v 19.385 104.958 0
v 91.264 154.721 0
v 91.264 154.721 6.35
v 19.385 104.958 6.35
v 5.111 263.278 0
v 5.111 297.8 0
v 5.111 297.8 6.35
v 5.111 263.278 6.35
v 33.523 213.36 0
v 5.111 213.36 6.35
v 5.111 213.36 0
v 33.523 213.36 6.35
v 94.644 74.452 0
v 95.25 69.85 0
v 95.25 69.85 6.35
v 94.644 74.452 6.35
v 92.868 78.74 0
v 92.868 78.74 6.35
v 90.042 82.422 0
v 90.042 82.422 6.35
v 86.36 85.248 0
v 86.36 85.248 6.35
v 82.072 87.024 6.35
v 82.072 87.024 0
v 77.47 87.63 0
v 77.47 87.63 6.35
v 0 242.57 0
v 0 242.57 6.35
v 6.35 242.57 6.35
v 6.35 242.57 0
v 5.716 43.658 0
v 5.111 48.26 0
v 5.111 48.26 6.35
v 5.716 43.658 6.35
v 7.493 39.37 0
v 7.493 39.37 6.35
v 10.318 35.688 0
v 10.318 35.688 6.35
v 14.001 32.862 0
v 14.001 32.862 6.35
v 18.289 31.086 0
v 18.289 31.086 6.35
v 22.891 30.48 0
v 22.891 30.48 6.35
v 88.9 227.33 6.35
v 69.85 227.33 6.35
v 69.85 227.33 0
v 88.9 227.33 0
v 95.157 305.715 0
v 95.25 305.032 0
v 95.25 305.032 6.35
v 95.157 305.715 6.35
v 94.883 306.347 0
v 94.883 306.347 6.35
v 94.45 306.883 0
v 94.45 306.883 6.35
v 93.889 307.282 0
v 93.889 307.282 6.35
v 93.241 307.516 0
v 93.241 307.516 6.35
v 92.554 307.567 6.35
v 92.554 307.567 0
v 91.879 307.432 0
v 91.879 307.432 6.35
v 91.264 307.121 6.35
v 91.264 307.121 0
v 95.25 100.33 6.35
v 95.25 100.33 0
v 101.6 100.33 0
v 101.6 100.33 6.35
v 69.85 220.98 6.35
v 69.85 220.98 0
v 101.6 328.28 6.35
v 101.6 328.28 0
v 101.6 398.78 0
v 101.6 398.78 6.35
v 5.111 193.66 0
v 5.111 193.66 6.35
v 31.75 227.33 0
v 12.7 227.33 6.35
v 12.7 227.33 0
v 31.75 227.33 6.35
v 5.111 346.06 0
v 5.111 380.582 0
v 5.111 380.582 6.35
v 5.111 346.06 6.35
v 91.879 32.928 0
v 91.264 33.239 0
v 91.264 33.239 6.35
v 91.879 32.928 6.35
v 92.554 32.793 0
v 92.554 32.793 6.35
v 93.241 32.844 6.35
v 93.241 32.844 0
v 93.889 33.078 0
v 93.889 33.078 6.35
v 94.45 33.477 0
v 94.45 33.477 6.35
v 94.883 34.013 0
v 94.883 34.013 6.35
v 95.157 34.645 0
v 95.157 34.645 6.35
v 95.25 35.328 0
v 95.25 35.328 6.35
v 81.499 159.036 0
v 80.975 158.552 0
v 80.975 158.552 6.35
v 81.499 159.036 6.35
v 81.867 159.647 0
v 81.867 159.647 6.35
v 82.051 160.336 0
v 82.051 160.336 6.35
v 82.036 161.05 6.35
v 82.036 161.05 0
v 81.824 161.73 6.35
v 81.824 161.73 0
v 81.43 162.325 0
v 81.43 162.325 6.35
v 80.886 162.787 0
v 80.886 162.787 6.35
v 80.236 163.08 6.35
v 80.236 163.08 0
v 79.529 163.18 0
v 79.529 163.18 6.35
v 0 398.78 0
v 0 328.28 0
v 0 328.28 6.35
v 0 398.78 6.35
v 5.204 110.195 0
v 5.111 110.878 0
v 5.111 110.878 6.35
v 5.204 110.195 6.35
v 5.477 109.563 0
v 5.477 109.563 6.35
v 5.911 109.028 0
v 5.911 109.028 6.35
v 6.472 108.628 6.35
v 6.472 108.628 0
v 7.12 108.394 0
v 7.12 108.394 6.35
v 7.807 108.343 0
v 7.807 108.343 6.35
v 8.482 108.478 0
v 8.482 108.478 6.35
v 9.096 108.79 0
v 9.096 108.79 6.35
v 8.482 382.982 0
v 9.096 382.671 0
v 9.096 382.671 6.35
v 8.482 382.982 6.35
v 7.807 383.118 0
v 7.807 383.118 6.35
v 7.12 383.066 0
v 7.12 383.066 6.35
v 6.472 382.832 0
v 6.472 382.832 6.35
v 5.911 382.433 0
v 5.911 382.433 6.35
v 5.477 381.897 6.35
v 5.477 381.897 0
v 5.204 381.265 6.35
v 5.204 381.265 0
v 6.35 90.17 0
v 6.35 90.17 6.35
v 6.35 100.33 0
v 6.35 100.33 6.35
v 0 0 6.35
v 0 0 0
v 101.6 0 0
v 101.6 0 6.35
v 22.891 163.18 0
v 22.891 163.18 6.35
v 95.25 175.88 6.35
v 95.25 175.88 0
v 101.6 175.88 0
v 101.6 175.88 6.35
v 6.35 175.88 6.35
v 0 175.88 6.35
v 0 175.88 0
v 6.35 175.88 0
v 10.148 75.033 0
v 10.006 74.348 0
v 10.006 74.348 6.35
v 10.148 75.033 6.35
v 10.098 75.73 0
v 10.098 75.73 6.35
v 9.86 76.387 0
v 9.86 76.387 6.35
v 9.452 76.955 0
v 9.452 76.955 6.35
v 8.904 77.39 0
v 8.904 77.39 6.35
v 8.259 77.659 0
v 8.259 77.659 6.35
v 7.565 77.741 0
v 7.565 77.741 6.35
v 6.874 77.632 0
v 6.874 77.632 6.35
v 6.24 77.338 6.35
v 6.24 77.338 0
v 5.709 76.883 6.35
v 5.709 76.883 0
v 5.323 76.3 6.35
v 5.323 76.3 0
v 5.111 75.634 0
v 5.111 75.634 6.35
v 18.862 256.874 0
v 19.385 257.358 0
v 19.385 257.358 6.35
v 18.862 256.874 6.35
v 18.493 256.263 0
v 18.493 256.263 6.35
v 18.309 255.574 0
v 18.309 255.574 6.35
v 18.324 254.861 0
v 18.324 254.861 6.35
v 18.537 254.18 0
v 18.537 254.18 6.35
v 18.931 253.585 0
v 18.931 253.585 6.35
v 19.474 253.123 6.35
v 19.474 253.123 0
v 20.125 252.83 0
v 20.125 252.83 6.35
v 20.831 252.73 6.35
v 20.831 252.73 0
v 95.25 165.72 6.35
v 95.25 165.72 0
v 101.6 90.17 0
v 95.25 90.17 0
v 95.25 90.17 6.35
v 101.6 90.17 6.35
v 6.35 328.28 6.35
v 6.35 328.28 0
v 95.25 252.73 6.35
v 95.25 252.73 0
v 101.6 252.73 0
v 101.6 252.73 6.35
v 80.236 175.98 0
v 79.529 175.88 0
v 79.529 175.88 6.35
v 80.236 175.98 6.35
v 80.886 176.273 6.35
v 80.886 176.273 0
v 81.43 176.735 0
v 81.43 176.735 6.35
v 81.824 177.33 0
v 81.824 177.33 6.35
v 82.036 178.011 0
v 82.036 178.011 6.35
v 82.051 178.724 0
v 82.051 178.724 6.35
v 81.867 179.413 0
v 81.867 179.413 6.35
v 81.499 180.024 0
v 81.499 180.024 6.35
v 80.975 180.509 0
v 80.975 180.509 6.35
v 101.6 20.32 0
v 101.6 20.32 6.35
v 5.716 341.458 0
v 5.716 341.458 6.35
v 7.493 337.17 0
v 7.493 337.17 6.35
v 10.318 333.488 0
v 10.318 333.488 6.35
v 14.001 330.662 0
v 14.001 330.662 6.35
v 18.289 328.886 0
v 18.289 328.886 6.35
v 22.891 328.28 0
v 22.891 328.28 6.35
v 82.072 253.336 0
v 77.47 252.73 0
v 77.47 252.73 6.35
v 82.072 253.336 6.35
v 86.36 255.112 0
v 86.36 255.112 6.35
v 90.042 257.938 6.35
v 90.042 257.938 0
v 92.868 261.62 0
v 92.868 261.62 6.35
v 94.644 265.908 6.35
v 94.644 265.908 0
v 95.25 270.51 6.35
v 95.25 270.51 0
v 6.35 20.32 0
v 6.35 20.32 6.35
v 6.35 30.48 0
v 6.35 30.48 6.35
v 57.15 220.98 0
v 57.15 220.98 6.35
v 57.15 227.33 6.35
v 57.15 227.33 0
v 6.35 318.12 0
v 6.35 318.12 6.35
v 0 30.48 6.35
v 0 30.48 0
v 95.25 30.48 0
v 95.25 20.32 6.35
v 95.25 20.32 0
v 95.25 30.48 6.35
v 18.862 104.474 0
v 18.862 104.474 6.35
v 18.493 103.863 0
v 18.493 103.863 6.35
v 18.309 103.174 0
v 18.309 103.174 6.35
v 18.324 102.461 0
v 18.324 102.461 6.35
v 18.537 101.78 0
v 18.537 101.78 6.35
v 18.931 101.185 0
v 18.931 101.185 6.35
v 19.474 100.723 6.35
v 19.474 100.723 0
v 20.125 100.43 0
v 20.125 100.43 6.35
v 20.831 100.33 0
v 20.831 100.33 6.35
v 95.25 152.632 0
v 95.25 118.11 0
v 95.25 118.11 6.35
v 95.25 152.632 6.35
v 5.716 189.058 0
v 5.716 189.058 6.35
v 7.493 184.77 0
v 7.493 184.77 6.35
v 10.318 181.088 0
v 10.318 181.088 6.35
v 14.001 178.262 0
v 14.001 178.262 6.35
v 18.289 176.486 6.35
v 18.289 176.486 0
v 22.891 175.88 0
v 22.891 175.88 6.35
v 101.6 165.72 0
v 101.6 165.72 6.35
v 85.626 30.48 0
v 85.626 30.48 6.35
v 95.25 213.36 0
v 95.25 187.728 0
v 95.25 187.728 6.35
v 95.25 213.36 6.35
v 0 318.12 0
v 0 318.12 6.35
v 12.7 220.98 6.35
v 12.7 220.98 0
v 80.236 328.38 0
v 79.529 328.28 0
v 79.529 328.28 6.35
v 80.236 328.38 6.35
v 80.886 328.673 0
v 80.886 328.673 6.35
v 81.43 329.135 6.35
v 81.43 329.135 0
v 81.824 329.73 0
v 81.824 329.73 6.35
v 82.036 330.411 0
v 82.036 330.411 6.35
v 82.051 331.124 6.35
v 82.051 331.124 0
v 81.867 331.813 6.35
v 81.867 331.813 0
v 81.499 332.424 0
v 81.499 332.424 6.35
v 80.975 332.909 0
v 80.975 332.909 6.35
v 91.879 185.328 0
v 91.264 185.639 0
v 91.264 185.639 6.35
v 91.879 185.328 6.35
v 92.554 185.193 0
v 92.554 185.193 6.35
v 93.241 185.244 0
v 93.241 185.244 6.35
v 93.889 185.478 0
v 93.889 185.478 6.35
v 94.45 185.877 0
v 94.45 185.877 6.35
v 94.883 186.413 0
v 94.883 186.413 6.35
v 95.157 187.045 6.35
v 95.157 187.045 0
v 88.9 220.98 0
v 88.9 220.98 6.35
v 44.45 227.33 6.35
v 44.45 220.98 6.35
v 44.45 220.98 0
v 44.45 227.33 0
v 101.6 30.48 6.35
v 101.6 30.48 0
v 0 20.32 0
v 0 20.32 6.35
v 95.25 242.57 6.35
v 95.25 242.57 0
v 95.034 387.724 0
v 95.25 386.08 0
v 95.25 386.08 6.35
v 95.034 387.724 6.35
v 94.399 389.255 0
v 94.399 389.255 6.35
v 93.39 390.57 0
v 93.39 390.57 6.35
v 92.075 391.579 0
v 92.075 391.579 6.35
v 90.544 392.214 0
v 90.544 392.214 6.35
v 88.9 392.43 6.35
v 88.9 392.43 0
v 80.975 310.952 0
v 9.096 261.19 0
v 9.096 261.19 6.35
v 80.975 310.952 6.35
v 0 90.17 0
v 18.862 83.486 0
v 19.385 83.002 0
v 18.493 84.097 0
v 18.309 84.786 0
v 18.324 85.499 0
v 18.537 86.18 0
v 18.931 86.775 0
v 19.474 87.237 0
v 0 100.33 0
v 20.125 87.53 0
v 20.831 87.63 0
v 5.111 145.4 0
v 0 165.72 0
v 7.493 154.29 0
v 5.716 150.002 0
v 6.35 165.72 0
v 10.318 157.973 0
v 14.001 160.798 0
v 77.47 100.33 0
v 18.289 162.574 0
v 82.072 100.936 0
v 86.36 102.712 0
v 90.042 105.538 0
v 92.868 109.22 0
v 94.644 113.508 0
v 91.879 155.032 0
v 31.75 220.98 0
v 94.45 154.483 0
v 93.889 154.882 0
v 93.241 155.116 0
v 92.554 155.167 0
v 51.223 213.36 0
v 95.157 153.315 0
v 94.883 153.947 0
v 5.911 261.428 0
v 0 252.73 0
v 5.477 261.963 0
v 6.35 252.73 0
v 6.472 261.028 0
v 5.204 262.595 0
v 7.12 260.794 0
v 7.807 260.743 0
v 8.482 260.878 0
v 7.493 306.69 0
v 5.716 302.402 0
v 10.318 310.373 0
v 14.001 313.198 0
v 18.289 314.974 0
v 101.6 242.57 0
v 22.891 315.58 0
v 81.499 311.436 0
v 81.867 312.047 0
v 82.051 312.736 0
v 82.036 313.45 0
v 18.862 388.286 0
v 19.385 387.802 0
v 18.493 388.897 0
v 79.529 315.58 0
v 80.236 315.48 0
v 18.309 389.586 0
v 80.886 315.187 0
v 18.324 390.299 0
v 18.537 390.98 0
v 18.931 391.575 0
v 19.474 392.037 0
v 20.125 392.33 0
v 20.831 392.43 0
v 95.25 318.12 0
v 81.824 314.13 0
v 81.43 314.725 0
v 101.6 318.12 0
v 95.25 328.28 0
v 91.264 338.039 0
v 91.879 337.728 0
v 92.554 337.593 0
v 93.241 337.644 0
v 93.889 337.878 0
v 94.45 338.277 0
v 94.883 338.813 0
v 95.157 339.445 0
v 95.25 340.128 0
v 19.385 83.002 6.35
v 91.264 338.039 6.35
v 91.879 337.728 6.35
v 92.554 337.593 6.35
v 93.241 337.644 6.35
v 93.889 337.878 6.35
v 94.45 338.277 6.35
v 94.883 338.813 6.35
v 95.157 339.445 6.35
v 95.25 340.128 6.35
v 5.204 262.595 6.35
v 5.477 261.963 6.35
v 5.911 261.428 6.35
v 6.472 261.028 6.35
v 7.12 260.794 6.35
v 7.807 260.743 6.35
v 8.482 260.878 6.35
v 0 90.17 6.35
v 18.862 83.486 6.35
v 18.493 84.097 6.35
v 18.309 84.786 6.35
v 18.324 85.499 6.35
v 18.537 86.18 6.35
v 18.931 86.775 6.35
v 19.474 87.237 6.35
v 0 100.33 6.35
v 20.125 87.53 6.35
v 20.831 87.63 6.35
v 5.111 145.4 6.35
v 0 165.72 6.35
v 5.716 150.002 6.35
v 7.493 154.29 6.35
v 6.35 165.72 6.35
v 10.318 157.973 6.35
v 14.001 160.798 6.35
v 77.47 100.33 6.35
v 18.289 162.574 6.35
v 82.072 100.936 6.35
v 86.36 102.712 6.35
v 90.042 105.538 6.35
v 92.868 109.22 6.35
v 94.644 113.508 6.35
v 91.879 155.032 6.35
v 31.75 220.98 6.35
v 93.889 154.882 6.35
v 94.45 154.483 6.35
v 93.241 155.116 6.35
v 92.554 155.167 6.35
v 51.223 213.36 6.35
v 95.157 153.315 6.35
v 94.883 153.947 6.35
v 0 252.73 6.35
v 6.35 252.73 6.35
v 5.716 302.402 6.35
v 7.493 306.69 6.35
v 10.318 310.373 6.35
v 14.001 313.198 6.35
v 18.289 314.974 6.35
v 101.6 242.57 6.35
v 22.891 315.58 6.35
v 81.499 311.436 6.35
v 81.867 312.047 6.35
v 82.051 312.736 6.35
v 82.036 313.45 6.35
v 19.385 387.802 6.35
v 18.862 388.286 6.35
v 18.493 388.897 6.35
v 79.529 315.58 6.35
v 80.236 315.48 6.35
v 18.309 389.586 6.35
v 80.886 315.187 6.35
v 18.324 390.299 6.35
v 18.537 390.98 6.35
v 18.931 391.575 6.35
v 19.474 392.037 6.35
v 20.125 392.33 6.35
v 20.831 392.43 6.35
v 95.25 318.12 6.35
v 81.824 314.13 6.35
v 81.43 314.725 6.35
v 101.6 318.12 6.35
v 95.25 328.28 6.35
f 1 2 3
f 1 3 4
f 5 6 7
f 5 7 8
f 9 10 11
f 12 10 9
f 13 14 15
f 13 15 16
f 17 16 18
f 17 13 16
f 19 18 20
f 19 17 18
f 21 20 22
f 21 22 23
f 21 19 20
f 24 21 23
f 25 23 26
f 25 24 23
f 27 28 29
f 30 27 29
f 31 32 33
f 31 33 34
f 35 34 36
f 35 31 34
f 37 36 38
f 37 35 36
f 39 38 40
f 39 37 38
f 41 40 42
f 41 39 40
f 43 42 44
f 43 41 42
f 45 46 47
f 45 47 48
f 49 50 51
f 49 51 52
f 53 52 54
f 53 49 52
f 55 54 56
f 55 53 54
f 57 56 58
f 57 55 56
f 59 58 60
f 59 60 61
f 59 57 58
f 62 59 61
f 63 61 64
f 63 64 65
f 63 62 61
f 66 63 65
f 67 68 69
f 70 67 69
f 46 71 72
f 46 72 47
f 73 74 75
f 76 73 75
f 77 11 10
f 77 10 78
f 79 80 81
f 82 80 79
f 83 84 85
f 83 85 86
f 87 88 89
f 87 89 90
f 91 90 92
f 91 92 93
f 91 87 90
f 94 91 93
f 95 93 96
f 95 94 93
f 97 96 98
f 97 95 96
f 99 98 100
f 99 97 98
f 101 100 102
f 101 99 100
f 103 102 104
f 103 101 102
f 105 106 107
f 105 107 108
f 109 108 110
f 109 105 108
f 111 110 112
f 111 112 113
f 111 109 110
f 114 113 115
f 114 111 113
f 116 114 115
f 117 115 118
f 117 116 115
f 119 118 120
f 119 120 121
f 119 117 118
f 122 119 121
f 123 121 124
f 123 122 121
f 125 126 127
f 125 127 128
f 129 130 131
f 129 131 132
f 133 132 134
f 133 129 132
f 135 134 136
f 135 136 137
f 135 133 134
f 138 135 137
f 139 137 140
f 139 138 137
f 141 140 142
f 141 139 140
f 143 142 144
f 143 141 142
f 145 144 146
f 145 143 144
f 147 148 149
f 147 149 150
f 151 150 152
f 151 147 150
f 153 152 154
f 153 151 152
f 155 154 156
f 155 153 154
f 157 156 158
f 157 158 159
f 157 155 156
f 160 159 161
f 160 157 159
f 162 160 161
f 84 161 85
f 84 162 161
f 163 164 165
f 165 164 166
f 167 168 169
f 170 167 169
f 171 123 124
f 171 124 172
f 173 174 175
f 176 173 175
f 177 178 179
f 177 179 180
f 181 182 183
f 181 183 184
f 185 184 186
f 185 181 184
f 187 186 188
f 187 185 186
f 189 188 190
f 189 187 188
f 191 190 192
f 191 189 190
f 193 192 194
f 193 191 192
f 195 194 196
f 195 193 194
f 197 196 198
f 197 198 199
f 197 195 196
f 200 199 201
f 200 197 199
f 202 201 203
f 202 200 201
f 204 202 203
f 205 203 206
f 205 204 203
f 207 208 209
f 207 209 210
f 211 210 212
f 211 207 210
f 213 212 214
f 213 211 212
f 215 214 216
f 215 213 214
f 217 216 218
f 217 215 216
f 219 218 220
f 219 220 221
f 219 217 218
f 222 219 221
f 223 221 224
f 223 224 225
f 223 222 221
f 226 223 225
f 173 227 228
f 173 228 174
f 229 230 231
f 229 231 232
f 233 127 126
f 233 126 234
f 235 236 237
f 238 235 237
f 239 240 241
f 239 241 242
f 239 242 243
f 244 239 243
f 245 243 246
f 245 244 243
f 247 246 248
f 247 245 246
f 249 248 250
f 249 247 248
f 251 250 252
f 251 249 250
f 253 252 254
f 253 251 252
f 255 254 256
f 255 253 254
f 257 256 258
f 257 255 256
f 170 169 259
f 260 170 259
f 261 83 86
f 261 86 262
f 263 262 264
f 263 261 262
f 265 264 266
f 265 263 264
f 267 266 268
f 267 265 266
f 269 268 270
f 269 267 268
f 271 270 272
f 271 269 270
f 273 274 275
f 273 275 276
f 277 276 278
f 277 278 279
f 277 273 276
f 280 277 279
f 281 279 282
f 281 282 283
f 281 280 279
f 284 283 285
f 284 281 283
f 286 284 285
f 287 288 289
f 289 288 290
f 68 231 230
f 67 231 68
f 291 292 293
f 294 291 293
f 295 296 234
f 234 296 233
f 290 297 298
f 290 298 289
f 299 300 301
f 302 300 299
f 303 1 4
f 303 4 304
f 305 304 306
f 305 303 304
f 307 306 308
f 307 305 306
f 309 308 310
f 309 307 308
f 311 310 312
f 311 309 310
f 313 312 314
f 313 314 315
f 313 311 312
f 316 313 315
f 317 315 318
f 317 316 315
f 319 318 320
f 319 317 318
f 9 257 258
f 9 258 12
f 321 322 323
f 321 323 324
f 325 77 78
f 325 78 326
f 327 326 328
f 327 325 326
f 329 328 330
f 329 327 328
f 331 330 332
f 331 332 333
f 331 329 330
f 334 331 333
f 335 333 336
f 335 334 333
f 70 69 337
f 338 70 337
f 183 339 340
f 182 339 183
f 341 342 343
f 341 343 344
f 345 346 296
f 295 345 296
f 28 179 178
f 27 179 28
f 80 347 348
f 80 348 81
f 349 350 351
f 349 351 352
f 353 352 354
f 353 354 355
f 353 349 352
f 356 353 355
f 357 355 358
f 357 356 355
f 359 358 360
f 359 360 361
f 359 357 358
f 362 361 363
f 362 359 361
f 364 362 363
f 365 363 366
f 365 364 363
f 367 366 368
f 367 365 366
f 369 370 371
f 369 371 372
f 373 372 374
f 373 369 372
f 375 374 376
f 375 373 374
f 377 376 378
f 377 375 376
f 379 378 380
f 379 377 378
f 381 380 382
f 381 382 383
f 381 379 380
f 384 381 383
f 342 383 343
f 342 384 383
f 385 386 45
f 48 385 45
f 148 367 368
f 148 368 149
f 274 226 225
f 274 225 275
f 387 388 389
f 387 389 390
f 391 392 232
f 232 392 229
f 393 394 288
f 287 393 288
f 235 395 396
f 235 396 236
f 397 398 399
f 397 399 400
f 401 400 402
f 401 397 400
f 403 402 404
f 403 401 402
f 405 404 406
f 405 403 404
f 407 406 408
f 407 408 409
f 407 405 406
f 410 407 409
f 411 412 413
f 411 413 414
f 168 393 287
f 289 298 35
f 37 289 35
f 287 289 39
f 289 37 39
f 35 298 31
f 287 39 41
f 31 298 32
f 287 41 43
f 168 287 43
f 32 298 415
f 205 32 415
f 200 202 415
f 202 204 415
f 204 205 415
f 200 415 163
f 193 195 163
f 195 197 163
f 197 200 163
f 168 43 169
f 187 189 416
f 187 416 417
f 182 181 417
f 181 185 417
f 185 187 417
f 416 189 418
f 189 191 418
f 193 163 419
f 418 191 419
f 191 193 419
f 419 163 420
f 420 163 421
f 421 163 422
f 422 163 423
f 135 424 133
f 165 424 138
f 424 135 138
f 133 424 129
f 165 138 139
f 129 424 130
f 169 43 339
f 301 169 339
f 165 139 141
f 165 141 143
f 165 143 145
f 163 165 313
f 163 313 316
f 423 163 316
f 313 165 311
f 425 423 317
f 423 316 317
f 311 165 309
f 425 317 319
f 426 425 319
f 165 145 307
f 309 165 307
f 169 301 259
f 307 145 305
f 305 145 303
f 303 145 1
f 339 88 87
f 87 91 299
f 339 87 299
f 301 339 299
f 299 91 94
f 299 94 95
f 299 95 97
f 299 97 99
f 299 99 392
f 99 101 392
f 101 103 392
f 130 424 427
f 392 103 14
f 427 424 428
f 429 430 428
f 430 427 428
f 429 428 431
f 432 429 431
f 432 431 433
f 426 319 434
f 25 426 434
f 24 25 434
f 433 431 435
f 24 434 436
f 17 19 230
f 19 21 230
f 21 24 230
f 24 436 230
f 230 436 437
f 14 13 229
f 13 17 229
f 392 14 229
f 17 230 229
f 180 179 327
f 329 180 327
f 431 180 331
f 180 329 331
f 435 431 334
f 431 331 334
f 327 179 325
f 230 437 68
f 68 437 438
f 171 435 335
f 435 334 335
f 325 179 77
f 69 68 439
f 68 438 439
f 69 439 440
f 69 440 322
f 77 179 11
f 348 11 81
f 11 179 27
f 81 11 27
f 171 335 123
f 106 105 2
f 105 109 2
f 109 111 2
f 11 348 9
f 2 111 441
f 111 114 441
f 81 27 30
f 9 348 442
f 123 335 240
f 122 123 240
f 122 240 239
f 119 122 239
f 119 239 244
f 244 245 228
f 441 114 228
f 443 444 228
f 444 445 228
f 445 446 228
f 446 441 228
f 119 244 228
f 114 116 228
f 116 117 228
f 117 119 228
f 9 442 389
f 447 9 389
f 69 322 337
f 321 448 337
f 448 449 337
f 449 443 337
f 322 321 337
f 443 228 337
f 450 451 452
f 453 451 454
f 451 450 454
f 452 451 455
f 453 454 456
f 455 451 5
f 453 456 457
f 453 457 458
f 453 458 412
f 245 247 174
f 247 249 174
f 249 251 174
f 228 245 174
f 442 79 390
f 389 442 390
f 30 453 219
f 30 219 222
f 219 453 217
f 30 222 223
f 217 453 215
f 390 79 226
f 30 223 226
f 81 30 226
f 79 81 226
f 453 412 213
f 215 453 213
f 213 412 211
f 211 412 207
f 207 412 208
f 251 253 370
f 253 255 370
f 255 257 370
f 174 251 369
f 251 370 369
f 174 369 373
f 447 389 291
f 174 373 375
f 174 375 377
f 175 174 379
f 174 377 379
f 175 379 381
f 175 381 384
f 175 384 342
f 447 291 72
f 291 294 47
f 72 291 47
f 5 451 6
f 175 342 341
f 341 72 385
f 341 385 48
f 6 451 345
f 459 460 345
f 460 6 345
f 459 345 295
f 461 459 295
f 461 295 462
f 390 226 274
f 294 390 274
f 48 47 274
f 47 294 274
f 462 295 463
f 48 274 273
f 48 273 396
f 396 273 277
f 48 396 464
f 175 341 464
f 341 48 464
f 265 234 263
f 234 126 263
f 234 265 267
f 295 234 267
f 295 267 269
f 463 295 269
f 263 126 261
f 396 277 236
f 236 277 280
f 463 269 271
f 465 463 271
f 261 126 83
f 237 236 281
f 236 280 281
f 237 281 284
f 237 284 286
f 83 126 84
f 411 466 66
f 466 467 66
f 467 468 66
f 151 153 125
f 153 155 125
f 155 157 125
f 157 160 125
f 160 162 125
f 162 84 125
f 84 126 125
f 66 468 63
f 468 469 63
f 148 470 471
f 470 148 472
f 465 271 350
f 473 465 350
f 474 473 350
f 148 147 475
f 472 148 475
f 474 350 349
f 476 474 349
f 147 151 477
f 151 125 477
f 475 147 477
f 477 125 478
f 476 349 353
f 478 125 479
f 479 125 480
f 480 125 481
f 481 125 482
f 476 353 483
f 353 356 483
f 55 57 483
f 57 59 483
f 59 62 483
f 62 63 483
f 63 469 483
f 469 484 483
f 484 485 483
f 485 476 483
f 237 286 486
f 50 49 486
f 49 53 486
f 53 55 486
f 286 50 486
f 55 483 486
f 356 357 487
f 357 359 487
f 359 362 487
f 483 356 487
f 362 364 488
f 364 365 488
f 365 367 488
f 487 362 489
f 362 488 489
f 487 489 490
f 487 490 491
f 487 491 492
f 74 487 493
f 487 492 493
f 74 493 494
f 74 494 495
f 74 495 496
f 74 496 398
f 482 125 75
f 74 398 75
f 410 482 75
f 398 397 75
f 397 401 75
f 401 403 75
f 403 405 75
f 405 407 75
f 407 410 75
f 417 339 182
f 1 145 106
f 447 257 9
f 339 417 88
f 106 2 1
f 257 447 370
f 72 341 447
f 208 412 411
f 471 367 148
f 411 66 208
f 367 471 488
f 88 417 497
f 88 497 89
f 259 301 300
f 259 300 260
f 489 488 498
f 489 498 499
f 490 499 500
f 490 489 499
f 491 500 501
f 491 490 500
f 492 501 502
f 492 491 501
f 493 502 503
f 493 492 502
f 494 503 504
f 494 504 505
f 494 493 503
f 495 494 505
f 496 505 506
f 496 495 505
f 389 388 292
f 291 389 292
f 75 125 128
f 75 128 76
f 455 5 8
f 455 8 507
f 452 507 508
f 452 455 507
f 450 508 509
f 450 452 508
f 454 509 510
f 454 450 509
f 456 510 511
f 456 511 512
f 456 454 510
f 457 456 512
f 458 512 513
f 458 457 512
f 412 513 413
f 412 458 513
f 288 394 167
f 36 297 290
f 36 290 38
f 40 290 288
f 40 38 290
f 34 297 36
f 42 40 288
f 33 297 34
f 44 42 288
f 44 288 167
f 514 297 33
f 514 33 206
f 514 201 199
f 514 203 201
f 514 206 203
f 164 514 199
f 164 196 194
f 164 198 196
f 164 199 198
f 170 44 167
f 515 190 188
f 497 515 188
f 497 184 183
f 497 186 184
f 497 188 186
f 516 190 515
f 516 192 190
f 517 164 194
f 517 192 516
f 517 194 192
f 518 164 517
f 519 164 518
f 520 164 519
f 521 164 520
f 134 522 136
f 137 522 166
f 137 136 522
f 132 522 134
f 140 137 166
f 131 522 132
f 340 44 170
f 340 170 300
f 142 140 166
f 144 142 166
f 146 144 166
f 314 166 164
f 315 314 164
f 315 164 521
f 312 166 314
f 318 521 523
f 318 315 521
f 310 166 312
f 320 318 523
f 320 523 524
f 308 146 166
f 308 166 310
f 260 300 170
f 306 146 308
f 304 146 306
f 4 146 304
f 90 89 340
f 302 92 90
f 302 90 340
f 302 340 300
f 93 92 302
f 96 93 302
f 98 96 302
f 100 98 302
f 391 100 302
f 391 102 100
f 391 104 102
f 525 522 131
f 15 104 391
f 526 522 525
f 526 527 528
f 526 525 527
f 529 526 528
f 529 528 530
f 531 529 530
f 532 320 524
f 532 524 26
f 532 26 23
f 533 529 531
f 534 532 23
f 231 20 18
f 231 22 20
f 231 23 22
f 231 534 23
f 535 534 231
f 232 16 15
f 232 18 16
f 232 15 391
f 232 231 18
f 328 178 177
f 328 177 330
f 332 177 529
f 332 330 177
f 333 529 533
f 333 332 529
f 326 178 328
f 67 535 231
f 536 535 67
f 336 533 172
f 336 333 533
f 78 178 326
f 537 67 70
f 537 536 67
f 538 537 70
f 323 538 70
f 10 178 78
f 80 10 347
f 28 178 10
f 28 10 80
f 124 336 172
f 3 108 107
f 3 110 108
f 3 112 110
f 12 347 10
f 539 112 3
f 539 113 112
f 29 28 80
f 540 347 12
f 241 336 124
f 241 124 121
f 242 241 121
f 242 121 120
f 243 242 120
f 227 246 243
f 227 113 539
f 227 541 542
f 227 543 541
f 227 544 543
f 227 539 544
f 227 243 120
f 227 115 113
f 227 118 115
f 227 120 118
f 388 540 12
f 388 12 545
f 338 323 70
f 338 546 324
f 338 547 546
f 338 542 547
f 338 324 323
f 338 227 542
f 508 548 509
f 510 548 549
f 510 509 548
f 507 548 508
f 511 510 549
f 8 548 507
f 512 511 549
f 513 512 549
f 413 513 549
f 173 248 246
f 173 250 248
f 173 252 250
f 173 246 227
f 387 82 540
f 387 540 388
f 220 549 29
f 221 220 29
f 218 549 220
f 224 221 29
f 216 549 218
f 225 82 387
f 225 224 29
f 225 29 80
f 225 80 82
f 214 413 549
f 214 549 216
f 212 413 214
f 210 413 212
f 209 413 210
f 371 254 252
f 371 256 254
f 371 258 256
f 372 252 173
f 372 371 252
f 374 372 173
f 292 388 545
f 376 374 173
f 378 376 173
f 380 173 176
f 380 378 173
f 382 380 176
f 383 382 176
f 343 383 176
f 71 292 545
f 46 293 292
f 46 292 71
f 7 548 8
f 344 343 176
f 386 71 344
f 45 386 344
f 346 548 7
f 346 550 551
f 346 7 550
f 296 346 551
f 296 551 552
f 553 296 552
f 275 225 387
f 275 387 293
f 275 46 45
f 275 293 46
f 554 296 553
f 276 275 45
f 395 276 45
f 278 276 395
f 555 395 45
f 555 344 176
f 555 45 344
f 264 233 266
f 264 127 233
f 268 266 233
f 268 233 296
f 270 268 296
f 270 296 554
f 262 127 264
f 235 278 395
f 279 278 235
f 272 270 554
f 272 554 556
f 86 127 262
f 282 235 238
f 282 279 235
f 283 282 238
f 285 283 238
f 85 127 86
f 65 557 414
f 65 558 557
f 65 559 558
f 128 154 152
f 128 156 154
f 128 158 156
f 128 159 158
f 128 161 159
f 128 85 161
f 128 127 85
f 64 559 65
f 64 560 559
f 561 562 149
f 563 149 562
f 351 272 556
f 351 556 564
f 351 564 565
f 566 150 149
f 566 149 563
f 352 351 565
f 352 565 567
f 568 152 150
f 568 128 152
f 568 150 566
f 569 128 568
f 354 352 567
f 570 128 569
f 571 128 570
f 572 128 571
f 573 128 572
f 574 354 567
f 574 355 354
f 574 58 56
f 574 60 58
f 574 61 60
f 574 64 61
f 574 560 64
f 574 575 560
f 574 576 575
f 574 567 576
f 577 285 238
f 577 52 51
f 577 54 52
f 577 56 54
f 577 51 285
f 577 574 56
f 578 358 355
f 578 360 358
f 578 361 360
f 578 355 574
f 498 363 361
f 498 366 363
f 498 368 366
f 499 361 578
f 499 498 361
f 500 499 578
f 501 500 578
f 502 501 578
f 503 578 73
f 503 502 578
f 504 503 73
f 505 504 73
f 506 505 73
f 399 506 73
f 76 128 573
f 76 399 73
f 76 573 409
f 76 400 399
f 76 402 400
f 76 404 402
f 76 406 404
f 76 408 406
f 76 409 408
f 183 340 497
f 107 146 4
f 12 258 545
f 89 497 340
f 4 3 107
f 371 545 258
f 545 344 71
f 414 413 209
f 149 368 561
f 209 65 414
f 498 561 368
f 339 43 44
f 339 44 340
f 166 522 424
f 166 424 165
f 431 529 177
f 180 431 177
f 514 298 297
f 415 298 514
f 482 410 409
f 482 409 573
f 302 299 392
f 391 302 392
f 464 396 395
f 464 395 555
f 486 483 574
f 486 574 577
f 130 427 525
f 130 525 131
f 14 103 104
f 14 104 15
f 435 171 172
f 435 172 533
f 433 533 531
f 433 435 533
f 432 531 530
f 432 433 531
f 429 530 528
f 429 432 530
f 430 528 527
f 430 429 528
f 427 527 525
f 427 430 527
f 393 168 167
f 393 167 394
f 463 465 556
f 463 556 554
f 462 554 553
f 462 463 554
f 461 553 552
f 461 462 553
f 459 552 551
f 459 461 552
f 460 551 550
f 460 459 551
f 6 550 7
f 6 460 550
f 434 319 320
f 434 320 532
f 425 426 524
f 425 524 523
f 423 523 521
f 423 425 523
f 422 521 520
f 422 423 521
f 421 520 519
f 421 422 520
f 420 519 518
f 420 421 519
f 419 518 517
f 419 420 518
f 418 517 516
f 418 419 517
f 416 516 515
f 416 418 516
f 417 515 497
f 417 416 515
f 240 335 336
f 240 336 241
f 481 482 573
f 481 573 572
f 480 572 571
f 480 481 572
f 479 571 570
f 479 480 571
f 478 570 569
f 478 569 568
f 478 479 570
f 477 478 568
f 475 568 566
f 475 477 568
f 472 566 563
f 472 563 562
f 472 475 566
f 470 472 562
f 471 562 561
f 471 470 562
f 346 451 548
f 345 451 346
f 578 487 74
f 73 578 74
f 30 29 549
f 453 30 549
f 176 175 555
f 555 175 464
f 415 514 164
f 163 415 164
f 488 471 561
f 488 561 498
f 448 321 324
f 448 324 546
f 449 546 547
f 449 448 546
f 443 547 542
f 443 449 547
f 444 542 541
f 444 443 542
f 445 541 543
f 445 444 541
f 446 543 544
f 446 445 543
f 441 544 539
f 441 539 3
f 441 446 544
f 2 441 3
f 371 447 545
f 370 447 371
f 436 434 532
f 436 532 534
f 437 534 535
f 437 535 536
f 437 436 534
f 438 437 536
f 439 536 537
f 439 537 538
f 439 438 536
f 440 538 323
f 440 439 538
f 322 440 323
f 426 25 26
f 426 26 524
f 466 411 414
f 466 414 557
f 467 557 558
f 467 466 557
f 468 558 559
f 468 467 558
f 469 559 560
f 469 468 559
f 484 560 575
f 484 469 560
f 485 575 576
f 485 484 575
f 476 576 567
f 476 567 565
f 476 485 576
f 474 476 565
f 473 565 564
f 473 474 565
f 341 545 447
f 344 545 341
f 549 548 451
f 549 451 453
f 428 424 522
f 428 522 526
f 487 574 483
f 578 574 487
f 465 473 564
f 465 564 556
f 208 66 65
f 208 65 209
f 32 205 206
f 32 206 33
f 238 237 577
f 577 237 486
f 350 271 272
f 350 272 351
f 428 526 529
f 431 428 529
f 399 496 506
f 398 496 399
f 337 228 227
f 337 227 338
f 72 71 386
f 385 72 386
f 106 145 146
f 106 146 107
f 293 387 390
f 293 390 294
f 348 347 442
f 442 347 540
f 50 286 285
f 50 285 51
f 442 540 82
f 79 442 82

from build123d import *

# Parameters (mm, degrees)
MODEL_W             = 101.6
MODEL_H             = 398.78
BOSS_EXTRUDE1_DEPTH = 6.35
SKETCH1_W           = 6.35
SKETCH1_H           = 10.16
CUT_EXTRUDE1_DEPTH  = 6.35
SKETCH2_W           = 95.776452478
SKETCH2_H           = 26.67
BOSS_EXTRUDE2_DEPTH = 6.35
SKETCH3_W           = 19.05
SKETCH3_H           = 6.35
SKETCH3_W_2         = 12.7
CUT_EXTRUDE2_DEPTH  = 6.35


with BuildPart() as part:
    # Model → Boss-Extrude1 (new body)
    with BuildSketch(Plane.XY):
        with Locations((50.8, 199.39)):
            Rectangle(MODEL_W, MODEL_H)
        with BuildLine():
            Line((77.47, 87.63), (20.83121403, 87.63))
            ThreePointArc((20.83121403, 87.63), (18.406749642, 85.847345646), (19.385420684, 83.001631833))
            Line((19.385420684, 83.001631833), (91.264206654, 33.239395393))
            ThreePointArc((91.264206654, 33.239395393), (93.888830968, 33.077884107), (95.25, 35.32776356))
            Line((95.25, 35.32776356), (95.25, 69.85))
            ThreePointArc((95.25, 69.85), (90.042358569, 82.422358569), (77.47, 87.63))
        make_face(mode=Mode.SUBTRACT)
        with BuildLine():
            Line((5.110654516, 145.400145775), (5.110654516, 110.877909335))
            ThreePointArc((5.110654516, 110.877909335), (6.471823548, 108.628029883), (9.096447862, 108.789541168))
            Line((9.096447862, 108.789541168), (80.975233831, 158.551777608))
            ThreePointArc((80.975233831, 158.551777608), (81.953904874, 161.397491422), (79.529440485, 163.180145775))
            Line((79.529440485, 163.180145775), (22.890654516, 163.180145775))
            ThreePointArc((22.890654516, 163.180145775), (10.318295946, 157.972504345), (5.110654516, 145.400145775))
        make_face(mode=Mode.SUBTRACT)
        with BuildLine():
            Line((77.47, 240.03), (20.83121403, 240.03))
            ThreePointArc((20.83121403, 240.03), (18.406749642, 238.247345646), (19.385420684, 235.401631833))
            Line((19.385420684, 235.401631833), (91.264206654, 185.639395393))
            ThreePointArc((91.264206654, 185.639395393), (93.888830968, 185.477884107), (95.25, 187.72776356))
            Line((95.25, 187.72776356), (95.25, 222.25))
            ThreePointArc((95.25, 222.25), (90.042358569, 234.822358569), (77.47, 240.03))
        make_face(mode=Mode.SUBTRACT)
        with BuildLine():
            Line((22.890654516, 175.880145775), (79.529440485, 175.880145775))
            ThreePointArc((79.529440485, 175.880145775), (81.953904874, 177.662800129), (80.975233831, 180.508513942))
            Line((80.975233831, 180.508513942), (9.096447862, 230.270750382))
            ThreePointArc((9.096447862, 230.270750382), (6.471823548, 230.432261668), (5.110654516, 228.182382216))
            Line((5.110654516, 228.182382216), (5.110654516, 193.660145775))
            ThreePointArc((5.110654516, 193.660145775), (10.318295946, 181.087787206), (22.890654516, 175.880145775))
        make_face(mode=Mode.SUBTRACT)
        with BuildLine():
            Line((91.264206654, 154.720604607), (19.385420684, 104.958368167))
            ThreePointArc((19.385420684, 104.958368167), (18.406749642, 102.112654354), (20.83121403, 100.33))
            Line((20.83121403, 100.33), (77.47, 100.33))
            ThreePointArc((77.47, 100.33), (90.042358569, 105.537641431), (95.25, 118.11))
            Line((95.25, 118.11), (95.25, 152.63223644))
            ThreePointArc((95.25, 152.63223644), (93.888830968, 154.882115893), (91.264206654, 154.720604607))
        make_face(mode=Mode.SUBTRACT)
        with BuildLine():
            Line((5.110654516, 297.800145775), (5.110654516, 263.277909335))
            ThreePointArc((5.110654516, 263.277909335), (6.471823548, 261.028029883), (9.096447862, 261.189541168))
            Line((9.096447862, 261.189541168), (80.975233831, 310.951777608))
            ThreePointArc((80.975233831, 310.951777608), (81.953904874, 313.797491422), (79.529440485, 315.580145775))
            Line((79.529440485, 315.580145775), (22.890654516, 315.580145775))
            ThreePointArc((22.890654516, 315.580145775), (10.318295946, 310.372504345), (5.110654516, 297.800145775))
        make_face(mode=Mode.SUBTRACT)
        with BuildLine():
            Line((88.9, 392.43), (20.83121403, 392.43))
            ThreePointArc((20.83121403, 392.43), (18.406749642, 390.647345646), (19.385420684, 387.801631833))
            Line((19.385420684, 387.801631833), (91.264206654, 338.039395393))
            ThreePointArc((91.264206654, 338.039395393), (93.888830968, 337.877884107), (95.25, 340.12776356))
            Line((95.25, 340.12776356), (95.25, 386.08))
            ThreePointArc((95.25, 386.08), (93.390128061, 390.570128061), (88.9, 392.43))
        make_face(mode=Mode.SUBTRACT)
        with BuildLine():
            Line((22.890654516, 328.280145775), (79.529440485, 328.280145775))
            ThreePointArc((79.529440485, 328.280145775), (81.953904874, 330.062800129), (80.975233831, 332.908513942))
            Line((80.975233831, 332.908513942), (9.096447862, 382.670750382))
            ThreePointArc((9.096447862, 382.670750382), (6.471823548, 382.832261668), (5.110654516, 380.582382216))
            Line((5.110654516, 380.582382216), (5.110654516, 346.060145775))
            ThreePointArc((5.110654516, 346.060145775), (10.318295946, 333.487787206), (22.890654516, 328.280145775))
        make_face(mode=Mode.SUBTRACT)
        with BuildLine():
            Line((22.890654516, 30.48), (85.626201641, 30.48))
            Line((85.626201641, 30.48), (10.005950978, 74.34818594))
            ThreePointArc((10.005950978, 74.34818594), (8.258764757, 77.658550083), (5.110654516, 75.633563082))
            Line((5.110654516, 75.633563082), (5.110654516, 48.26))
            ThreePointArc((5.110654516, 48.26), (10.318295946, 35.687641431), (22.890654516, 30.48))
        make_face(mode=Mode.SUBTRACT)
        with BuildLine():
            Line((91.264206654, 307.120604607), (19.385420684, 257.358368167))
            ThreePointArc((19.385420684, 257.358368167), (18.406749642, 254.512654354), (20.83121403, 252.73))
            Line((20.83121403, 252.73), (77.47, 252.73))
            ThreePointArc((77.47, 252.73), (90.042358569, 257.937641431), (95.25, 270.51))
            Line((95.25, 270.51), (95.25, 305.03223644))
            ThreePointArc((95.25, 305.03223644), (93.888830968, 307.282115893), (91.264206654, 307.120604607))
        make_face(mode=Mode.SUBTRACT)
    extrude(amount=BOSS_EXTRUDE1_DEPTH)

    # Sketch1 → Cut-Extrude1 (cut)
    with BuildSketch(Plane.XY.offset(6.35)):
        with Locations((98.425, 323.200145775)):
            Rectangle(SKETCH1_W, SKETCH1_H)
        with Locations((98.425, 247.65)):
            Rectangle(SKETCH1_W, SKETCH1_H)
        with Locations((3.175, 247.65)):
            Rectangle(SKETCH1_W, SKETCH1_H)
        with Locations((3.175, 25.4)):
            Rectangle(SKETCH1_W, SKETCH1_H)
        with Locations((98.425, 170.800145775)):
            Rectangle(SKETCH1_W, SKETCH1_H)
        with Locations((3.175, 323.200145775)):
            Rectangle(SKETCH1_W, SKETCH1_H)
        with Locations((98.425, 25.4)):
            Rectangle(SKETCH1_W, SKETCH1_H)
        with Locations((98.425, 95.25)):
            Rectangle(SKETCH1_W, SKETCH1_H)
        with Locations((3.175, 95.25)):
            Rectangle(SKETCH1_W, SKETCH1_H)
        with Locations((3.175, 170.800145775)):
            Rectangle(SKETCH1_W, SKETCH1_H)
    extrude(amount=-CUT_EXTRUDE1_DEPTH, mode=Mode.SUBTRACT)

    # Sketch2 → Boss-Extrude2 (add)
    with BuildSketch(Plane.XY.offset(6.35)):
        with Locations((49.666030554, 226.695)):
            Rectangle(SKETCH2_W, SKETCH2_H)
    extrude(amount=-BOSS_EXTRUDE2_DEPTH)

    # Sketch3 → Cut-Extrude2 (cut)
    with BuildSketch(Plane.XY.offset(6.35)):
        with Locations((79.375, 224.155)):
            Rectangle(SKETCH3_W, SKETCH3_H)
        with Locations((22.225, 224.155)):
            Rectangle(SKETCH3_W, SKETCH3_H)
        with Locations((50.8, 224.155)):
            Rectangle(SKETCH3_W_2, SKETCH3_H)
    extrude(amount=-CUT_EXTRUDE2_DEPTH, mode=Mode.SUBTRACT)


solid = part.part
